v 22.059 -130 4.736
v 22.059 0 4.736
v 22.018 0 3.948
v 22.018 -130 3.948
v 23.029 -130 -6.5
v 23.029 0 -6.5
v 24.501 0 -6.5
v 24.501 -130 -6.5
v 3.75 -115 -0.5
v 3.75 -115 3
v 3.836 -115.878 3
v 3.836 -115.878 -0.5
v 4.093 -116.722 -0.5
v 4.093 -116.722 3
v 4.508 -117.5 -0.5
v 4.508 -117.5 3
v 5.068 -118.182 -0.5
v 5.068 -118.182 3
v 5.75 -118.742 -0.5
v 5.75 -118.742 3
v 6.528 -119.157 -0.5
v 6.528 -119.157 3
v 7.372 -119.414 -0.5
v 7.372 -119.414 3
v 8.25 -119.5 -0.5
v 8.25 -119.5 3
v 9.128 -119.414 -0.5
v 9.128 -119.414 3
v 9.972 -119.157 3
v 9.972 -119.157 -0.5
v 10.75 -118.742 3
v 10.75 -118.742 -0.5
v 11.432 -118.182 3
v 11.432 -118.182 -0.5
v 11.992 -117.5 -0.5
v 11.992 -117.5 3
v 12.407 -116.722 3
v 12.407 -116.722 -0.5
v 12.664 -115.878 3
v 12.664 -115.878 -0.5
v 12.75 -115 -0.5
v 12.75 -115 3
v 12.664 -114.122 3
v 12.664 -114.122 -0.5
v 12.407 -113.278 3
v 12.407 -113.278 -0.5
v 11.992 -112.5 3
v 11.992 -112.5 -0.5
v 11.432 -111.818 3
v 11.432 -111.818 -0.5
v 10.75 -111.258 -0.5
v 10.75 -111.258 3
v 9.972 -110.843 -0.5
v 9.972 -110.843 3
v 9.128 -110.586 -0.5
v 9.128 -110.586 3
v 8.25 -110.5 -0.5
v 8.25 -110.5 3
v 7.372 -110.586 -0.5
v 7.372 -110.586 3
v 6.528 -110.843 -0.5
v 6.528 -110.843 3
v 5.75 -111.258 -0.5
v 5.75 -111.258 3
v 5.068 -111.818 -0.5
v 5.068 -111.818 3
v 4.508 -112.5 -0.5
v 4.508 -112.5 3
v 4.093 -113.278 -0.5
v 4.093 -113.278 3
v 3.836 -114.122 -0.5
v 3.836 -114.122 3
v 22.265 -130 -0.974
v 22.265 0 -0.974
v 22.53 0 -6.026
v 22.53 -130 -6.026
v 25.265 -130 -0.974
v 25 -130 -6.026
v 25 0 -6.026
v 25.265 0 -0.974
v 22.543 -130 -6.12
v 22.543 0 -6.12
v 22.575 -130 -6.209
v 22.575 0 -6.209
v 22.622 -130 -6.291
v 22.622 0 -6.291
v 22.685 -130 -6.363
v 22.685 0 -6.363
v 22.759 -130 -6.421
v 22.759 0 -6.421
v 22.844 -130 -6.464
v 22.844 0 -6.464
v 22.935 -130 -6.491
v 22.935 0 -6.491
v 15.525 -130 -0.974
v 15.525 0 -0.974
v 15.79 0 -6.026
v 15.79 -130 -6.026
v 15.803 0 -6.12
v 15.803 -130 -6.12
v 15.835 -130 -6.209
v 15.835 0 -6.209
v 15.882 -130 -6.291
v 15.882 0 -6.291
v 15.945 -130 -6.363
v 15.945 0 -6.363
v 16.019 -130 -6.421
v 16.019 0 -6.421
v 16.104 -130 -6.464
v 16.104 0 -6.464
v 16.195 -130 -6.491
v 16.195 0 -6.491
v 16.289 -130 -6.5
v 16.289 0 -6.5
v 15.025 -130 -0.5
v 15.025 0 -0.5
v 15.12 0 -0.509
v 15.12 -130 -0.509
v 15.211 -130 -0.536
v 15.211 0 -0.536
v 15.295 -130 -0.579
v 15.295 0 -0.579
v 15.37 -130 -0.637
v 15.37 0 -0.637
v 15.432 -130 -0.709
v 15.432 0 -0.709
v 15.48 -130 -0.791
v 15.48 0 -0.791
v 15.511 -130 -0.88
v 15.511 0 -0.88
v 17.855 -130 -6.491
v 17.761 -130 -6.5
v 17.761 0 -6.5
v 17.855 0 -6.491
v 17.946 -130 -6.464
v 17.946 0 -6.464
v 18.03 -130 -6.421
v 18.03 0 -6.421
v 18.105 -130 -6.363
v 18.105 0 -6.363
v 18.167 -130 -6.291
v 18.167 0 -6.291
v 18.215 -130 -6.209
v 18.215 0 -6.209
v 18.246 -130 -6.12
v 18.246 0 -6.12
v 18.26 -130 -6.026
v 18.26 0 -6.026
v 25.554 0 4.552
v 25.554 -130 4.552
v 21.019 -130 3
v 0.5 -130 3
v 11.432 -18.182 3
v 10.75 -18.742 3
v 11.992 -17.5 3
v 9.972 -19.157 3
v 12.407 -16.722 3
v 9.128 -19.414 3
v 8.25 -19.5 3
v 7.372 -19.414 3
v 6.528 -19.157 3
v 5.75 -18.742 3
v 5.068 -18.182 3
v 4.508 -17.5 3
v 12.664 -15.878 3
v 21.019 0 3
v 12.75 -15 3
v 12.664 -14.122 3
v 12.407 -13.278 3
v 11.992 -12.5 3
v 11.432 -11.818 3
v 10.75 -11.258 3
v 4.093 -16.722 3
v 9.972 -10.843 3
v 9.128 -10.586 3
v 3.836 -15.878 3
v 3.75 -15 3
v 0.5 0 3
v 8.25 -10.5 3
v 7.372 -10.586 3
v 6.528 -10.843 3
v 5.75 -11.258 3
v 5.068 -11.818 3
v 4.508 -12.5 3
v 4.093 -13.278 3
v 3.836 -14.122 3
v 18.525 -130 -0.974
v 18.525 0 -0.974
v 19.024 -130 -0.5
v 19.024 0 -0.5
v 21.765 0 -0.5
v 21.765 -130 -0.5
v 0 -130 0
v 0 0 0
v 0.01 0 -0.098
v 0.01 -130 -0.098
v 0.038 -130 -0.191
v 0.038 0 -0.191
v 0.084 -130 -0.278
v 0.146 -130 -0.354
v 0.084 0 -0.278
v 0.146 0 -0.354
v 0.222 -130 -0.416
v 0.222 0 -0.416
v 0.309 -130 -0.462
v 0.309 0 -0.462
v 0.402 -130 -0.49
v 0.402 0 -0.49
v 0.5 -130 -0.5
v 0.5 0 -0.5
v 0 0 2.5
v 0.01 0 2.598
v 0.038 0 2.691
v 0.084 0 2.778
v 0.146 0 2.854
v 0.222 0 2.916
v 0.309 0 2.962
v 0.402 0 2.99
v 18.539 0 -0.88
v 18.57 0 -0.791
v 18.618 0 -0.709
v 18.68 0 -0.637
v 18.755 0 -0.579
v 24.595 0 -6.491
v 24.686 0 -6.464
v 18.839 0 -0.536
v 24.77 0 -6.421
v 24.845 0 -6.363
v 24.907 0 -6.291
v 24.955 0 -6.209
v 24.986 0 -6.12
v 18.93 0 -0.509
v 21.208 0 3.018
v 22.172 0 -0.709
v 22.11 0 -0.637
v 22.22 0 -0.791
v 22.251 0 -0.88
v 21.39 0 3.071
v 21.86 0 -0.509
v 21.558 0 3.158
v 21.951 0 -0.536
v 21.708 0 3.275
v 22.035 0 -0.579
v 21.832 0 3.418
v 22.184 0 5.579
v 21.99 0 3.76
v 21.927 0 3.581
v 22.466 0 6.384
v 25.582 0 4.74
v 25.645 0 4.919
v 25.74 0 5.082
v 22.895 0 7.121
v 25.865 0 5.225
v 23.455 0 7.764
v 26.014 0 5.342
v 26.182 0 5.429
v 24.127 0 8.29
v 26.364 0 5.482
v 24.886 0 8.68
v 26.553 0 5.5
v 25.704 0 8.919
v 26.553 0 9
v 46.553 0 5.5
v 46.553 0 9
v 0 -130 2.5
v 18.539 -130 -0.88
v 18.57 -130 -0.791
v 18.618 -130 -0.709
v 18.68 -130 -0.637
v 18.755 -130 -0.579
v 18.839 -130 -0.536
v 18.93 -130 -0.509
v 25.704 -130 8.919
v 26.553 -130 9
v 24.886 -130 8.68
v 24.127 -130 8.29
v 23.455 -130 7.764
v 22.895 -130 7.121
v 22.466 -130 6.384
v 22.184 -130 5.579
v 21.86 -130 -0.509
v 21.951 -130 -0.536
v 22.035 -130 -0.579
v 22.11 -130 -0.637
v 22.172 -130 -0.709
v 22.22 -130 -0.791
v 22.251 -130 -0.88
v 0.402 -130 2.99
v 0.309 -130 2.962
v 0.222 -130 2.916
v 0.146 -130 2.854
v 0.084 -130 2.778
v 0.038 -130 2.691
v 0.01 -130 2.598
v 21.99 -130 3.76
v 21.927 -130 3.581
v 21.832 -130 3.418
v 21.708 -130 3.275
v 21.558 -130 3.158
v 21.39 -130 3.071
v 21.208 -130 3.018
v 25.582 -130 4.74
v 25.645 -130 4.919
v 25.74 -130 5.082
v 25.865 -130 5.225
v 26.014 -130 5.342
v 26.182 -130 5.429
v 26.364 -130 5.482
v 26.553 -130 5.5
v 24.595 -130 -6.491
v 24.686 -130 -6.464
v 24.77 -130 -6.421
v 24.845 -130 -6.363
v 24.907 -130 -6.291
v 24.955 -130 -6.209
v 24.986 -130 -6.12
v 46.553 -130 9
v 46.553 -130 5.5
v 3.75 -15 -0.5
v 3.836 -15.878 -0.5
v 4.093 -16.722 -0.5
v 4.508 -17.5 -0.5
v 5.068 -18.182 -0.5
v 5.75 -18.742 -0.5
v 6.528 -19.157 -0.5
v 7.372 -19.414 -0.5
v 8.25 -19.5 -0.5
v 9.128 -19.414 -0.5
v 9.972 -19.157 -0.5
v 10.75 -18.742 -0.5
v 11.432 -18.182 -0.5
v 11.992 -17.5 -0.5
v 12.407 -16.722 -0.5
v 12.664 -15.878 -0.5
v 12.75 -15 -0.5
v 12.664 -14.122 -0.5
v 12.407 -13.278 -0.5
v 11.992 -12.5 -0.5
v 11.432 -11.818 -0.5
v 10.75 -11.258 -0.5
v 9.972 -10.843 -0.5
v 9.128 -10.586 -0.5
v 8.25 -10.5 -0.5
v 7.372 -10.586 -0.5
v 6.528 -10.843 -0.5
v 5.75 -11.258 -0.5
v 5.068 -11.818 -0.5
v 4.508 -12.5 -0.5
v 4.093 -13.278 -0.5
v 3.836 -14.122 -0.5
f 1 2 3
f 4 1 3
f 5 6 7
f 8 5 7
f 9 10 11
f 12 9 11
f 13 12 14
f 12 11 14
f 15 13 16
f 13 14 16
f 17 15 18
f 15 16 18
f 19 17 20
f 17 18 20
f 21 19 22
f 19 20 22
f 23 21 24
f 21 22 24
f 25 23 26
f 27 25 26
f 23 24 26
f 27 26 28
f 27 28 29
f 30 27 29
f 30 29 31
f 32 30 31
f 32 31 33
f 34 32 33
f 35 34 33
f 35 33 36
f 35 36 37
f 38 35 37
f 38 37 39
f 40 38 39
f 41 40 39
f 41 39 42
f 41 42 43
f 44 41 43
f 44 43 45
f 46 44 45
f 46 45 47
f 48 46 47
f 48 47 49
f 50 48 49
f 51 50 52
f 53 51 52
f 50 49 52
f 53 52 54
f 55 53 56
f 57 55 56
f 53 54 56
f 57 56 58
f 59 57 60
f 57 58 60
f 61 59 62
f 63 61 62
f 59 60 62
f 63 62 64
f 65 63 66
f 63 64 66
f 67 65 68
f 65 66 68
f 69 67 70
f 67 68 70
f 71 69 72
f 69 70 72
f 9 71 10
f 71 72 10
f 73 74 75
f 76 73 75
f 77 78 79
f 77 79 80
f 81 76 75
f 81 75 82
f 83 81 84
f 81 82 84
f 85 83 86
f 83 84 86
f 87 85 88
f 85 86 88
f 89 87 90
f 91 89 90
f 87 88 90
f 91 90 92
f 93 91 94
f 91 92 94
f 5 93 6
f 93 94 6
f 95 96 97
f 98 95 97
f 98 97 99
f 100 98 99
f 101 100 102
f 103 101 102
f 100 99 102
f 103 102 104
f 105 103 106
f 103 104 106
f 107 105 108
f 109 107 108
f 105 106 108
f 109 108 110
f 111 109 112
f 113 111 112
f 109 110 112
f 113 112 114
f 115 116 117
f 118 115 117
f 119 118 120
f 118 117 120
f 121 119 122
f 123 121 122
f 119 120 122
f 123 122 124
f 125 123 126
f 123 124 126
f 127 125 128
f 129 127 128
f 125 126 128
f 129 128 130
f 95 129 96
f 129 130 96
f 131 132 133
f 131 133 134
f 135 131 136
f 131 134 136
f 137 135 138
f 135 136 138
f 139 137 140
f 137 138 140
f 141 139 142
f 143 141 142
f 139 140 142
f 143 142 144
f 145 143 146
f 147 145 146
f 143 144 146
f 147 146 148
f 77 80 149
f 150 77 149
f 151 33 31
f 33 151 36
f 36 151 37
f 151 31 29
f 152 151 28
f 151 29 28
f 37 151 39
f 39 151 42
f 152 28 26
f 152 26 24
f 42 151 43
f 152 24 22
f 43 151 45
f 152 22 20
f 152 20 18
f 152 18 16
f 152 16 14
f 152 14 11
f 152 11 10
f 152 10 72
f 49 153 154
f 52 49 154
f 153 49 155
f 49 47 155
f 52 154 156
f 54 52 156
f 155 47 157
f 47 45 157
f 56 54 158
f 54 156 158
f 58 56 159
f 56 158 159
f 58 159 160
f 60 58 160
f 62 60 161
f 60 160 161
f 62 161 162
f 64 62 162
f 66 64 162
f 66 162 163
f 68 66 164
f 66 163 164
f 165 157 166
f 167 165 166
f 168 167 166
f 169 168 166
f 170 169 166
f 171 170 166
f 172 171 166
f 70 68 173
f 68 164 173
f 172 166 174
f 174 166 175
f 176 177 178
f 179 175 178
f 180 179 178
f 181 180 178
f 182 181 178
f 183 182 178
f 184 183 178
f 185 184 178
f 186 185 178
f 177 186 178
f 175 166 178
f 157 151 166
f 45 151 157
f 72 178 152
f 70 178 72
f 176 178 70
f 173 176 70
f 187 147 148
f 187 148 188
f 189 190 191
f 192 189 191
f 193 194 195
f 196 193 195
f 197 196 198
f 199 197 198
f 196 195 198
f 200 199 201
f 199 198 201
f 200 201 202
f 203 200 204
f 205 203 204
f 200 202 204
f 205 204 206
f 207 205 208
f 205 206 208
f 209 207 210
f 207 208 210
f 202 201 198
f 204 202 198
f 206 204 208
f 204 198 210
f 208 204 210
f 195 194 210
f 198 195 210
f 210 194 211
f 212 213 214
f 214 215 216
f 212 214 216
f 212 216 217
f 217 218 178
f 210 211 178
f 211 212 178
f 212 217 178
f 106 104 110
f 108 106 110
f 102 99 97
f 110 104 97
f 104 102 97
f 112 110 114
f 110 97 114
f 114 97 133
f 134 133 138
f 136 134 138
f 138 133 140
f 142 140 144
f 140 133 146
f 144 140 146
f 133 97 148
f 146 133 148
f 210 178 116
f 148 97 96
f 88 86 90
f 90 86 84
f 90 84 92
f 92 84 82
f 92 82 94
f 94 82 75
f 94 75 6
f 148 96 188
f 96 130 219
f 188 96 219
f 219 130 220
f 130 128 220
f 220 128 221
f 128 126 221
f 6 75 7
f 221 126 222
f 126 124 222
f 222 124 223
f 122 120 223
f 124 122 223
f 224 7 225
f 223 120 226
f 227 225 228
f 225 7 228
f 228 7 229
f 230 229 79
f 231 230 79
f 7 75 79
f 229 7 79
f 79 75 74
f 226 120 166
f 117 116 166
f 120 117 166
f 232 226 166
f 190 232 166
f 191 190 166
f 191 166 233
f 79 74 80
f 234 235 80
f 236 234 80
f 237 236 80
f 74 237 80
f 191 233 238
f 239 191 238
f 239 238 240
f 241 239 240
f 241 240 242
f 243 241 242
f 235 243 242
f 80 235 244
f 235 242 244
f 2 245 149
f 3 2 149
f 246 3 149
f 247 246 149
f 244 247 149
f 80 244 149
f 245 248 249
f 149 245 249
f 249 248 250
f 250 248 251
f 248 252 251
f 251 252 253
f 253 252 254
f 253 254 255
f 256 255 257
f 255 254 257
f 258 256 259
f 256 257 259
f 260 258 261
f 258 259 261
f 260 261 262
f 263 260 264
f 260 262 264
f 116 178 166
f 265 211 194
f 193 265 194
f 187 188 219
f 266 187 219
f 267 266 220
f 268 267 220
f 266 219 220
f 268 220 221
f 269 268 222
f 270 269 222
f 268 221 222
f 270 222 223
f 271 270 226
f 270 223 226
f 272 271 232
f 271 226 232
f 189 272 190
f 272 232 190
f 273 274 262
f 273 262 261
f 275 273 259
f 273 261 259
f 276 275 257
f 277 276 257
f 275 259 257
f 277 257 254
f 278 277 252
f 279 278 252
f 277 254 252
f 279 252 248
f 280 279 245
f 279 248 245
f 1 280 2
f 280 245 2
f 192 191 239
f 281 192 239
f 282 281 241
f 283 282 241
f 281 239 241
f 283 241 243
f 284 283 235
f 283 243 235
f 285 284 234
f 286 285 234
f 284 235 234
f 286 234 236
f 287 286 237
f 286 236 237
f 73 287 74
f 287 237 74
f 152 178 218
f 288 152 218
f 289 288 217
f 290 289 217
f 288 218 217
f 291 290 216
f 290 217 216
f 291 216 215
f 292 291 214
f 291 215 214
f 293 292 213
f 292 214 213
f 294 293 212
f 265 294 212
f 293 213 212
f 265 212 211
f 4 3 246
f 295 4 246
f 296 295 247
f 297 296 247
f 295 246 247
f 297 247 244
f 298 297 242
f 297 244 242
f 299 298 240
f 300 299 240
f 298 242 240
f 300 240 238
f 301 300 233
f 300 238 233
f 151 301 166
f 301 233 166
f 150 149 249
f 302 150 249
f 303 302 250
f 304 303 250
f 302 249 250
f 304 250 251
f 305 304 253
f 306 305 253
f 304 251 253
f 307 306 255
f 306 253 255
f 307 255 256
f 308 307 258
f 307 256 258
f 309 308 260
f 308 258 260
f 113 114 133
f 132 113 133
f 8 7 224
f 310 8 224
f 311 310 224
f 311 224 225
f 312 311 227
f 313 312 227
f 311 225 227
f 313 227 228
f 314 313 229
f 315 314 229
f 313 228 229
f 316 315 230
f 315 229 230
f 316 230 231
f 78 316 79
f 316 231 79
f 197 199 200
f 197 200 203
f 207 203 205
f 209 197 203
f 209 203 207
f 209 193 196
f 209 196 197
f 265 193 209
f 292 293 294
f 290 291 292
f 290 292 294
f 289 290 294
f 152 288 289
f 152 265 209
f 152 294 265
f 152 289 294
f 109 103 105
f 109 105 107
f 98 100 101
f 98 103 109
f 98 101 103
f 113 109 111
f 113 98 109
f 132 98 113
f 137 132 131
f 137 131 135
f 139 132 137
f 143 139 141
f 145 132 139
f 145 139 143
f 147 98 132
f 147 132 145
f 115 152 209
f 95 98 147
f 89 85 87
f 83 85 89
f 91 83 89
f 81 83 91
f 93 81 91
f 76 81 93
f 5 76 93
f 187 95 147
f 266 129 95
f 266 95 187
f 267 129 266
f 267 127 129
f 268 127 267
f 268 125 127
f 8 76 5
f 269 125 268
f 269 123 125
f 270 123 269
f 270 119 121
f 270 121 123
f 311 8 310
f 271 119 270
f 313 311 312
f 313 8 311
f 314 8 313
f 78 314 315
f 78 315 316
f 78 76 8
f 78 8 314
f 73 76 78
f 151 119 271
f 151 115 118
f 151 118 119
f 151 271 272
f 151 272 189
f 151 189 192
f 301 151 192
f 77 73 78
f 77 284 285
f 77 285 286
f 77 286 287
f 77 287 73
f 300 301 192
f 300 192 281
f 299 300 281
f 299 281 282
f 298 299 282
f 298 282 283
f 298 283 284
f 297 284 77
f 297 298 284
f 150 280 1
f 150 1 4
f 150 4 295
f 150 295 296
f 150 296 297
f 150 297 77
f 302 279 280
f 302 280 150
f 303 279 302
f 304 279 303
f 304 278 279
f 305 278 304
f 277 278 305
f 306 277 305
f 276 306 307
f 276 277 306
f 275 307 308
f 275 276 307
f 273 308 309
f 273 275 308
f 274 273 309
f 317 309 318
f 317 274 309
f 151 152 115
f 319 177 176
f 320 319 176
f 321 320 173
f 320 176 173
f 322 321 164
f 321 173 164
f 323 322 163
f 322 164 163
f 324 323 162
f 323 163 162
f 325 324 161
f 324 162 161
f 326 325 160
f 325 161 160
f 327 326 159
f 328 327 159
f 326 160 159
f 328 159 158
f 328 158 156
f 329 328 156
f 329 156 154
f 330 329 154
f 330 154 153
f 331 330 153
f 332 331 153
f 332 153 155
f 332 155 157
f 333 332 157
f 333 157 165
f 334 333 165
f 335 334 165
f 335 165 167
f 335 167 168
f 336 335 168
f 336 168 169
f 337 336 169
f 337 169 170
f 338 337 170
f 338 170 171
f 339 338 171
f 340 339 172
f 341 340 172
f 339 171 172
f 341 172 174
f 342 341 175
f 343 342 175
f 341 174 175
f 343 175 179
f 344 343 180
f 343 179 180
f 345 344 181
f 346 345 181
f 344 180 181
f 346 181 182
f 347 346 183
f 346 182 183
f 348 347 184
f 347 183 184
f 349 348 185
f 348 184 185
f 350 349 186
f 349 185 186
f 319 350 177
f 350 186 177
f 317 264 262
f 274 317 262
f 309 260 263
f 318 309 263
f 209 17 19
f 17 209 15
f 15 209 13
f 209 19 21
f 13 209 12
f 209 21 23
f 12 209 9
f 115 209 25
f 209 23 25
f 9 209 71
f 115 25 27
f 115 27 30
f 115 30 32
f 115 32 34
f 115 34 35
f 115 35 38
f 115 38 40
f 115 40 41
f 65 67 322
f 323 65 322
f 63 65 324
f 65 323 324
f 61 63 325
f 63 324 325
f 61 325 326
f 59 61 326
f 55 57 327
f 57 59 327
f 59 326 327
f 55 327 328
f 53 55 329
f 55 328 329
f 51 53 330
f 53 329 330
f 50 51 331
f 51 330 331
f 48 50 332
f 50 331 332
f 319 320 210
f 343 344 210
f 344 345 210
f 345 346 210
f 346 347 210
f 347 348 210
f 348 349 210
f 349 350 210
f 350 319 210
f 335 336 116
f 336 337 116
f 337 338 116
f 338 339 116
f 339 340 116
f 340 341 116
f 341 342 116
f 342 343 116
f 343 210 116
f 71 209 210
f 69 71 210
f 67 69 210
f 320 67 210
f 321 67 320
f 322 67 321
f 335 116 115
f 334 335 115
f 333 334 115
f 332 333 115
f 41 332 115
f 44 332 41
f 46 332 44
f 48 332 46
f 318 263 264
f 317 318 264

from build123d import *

# Parameters (mm, degrees)
F1_DEPTH = 130
F3_D     = 9
F4_D     = 9


with BuildPart() as f1:
    # F0 (on Front) → F1 (new body)
    with BuildSketch(Plane.XZ):
        with BuildLine():
            Line((25, -6.026168), (25.264782, -0.973832))
            Line((25.264782, -0.973832), (25.554396, 4.552336))
            ThreePointArc((25.554396, 4.552336), (25.864671, 5.225374), (26.553025, 5.5))
            Line((26.553025, 5.5), (46.553025, 5.5))
            Line((46.553025, 5.5), (46.553025, 9))
            Line((46.553025, 9), (26.553025, 9))
            ThreePointArc((26.553025, 9), (23.45543, 7.764185), (22.059193, 4.735512))
            Line((22.059193, 4.735512), (22.017903, 3.947664))
            ThreePointArc((22.017903, 3.947664), (21.707628, 3.274626), (21.019274, 3))
            Line((21.019274, 3), (0.5, 3))
            ThreePointArc((0.5, 3), (0.146447, 2.853553), (0, 2.5))
            Line((0, 2.5), (0, 0))
            ThreePointArc((0, 0), (0.146447, -0.353553), (0.5, -0.5))
            Line((0.5, -0.5), (15.025467, -0.5))
            ThreePointArc((15.025467, -0.5), (15.369644, -0.637313), (15.524782, -0.973832))
            Line((15.524782, -0.973832), (15.789563, -6.026168))
            ThreePointArc((15.789563, -6.026168), (15.944701, -6.362687), (16.288878, -6.5))
            Line((16.288878, -6.5), (17.760685, -6.5))
            ThreePointArc((17.760685, -6.5), (18.104863, -6.362687), (18.26, -6.026168))
            Line((18.26, -6.026168), (18.524782, -0.973832))
            ThreePointArc((18.524782, -0.973832), (18.679919, -0.637313), (19.024096, -0.5))
            Line((19.024096, -0.5), (21.765467, -0.5))
            ThreePointArc((21.765467, -0.5), (22.109644, -0.637313), (22.264782, -0.973832))
            Line((22.264782, -0.973832), (22.529563, -6.026168))
            ThreePointArc((22.529563, -6.026168), (22.684701, -6.362687), (23.028878, -6.5))
            Line((23.028878, -6.5), (24.500685, -6.5))
            ThreePointArc((24.500685, -6.5), (24.844863, -6.362687), (25, -6.026168))
        make_face()
    extrude(amount=F1_DEPTH)

    # F3 (through all)
    with Locations(Plane(origin=(0, 0, -0.5), x_dir=(1, 0, 0), z_dir=(0, 0, -1))):
        with Locations((8.25, 115)):
            Hole(F3_D / 2)

    # F4 (through all)
    with Locations(Plane(origin=(0, 0, -0.5), x_dir=(1, 0, 0), z_dir=(0, 0, -1))):
        with Locations((8.25, 15)):
            Hole(F4_D / 2)


solid = f1.part
